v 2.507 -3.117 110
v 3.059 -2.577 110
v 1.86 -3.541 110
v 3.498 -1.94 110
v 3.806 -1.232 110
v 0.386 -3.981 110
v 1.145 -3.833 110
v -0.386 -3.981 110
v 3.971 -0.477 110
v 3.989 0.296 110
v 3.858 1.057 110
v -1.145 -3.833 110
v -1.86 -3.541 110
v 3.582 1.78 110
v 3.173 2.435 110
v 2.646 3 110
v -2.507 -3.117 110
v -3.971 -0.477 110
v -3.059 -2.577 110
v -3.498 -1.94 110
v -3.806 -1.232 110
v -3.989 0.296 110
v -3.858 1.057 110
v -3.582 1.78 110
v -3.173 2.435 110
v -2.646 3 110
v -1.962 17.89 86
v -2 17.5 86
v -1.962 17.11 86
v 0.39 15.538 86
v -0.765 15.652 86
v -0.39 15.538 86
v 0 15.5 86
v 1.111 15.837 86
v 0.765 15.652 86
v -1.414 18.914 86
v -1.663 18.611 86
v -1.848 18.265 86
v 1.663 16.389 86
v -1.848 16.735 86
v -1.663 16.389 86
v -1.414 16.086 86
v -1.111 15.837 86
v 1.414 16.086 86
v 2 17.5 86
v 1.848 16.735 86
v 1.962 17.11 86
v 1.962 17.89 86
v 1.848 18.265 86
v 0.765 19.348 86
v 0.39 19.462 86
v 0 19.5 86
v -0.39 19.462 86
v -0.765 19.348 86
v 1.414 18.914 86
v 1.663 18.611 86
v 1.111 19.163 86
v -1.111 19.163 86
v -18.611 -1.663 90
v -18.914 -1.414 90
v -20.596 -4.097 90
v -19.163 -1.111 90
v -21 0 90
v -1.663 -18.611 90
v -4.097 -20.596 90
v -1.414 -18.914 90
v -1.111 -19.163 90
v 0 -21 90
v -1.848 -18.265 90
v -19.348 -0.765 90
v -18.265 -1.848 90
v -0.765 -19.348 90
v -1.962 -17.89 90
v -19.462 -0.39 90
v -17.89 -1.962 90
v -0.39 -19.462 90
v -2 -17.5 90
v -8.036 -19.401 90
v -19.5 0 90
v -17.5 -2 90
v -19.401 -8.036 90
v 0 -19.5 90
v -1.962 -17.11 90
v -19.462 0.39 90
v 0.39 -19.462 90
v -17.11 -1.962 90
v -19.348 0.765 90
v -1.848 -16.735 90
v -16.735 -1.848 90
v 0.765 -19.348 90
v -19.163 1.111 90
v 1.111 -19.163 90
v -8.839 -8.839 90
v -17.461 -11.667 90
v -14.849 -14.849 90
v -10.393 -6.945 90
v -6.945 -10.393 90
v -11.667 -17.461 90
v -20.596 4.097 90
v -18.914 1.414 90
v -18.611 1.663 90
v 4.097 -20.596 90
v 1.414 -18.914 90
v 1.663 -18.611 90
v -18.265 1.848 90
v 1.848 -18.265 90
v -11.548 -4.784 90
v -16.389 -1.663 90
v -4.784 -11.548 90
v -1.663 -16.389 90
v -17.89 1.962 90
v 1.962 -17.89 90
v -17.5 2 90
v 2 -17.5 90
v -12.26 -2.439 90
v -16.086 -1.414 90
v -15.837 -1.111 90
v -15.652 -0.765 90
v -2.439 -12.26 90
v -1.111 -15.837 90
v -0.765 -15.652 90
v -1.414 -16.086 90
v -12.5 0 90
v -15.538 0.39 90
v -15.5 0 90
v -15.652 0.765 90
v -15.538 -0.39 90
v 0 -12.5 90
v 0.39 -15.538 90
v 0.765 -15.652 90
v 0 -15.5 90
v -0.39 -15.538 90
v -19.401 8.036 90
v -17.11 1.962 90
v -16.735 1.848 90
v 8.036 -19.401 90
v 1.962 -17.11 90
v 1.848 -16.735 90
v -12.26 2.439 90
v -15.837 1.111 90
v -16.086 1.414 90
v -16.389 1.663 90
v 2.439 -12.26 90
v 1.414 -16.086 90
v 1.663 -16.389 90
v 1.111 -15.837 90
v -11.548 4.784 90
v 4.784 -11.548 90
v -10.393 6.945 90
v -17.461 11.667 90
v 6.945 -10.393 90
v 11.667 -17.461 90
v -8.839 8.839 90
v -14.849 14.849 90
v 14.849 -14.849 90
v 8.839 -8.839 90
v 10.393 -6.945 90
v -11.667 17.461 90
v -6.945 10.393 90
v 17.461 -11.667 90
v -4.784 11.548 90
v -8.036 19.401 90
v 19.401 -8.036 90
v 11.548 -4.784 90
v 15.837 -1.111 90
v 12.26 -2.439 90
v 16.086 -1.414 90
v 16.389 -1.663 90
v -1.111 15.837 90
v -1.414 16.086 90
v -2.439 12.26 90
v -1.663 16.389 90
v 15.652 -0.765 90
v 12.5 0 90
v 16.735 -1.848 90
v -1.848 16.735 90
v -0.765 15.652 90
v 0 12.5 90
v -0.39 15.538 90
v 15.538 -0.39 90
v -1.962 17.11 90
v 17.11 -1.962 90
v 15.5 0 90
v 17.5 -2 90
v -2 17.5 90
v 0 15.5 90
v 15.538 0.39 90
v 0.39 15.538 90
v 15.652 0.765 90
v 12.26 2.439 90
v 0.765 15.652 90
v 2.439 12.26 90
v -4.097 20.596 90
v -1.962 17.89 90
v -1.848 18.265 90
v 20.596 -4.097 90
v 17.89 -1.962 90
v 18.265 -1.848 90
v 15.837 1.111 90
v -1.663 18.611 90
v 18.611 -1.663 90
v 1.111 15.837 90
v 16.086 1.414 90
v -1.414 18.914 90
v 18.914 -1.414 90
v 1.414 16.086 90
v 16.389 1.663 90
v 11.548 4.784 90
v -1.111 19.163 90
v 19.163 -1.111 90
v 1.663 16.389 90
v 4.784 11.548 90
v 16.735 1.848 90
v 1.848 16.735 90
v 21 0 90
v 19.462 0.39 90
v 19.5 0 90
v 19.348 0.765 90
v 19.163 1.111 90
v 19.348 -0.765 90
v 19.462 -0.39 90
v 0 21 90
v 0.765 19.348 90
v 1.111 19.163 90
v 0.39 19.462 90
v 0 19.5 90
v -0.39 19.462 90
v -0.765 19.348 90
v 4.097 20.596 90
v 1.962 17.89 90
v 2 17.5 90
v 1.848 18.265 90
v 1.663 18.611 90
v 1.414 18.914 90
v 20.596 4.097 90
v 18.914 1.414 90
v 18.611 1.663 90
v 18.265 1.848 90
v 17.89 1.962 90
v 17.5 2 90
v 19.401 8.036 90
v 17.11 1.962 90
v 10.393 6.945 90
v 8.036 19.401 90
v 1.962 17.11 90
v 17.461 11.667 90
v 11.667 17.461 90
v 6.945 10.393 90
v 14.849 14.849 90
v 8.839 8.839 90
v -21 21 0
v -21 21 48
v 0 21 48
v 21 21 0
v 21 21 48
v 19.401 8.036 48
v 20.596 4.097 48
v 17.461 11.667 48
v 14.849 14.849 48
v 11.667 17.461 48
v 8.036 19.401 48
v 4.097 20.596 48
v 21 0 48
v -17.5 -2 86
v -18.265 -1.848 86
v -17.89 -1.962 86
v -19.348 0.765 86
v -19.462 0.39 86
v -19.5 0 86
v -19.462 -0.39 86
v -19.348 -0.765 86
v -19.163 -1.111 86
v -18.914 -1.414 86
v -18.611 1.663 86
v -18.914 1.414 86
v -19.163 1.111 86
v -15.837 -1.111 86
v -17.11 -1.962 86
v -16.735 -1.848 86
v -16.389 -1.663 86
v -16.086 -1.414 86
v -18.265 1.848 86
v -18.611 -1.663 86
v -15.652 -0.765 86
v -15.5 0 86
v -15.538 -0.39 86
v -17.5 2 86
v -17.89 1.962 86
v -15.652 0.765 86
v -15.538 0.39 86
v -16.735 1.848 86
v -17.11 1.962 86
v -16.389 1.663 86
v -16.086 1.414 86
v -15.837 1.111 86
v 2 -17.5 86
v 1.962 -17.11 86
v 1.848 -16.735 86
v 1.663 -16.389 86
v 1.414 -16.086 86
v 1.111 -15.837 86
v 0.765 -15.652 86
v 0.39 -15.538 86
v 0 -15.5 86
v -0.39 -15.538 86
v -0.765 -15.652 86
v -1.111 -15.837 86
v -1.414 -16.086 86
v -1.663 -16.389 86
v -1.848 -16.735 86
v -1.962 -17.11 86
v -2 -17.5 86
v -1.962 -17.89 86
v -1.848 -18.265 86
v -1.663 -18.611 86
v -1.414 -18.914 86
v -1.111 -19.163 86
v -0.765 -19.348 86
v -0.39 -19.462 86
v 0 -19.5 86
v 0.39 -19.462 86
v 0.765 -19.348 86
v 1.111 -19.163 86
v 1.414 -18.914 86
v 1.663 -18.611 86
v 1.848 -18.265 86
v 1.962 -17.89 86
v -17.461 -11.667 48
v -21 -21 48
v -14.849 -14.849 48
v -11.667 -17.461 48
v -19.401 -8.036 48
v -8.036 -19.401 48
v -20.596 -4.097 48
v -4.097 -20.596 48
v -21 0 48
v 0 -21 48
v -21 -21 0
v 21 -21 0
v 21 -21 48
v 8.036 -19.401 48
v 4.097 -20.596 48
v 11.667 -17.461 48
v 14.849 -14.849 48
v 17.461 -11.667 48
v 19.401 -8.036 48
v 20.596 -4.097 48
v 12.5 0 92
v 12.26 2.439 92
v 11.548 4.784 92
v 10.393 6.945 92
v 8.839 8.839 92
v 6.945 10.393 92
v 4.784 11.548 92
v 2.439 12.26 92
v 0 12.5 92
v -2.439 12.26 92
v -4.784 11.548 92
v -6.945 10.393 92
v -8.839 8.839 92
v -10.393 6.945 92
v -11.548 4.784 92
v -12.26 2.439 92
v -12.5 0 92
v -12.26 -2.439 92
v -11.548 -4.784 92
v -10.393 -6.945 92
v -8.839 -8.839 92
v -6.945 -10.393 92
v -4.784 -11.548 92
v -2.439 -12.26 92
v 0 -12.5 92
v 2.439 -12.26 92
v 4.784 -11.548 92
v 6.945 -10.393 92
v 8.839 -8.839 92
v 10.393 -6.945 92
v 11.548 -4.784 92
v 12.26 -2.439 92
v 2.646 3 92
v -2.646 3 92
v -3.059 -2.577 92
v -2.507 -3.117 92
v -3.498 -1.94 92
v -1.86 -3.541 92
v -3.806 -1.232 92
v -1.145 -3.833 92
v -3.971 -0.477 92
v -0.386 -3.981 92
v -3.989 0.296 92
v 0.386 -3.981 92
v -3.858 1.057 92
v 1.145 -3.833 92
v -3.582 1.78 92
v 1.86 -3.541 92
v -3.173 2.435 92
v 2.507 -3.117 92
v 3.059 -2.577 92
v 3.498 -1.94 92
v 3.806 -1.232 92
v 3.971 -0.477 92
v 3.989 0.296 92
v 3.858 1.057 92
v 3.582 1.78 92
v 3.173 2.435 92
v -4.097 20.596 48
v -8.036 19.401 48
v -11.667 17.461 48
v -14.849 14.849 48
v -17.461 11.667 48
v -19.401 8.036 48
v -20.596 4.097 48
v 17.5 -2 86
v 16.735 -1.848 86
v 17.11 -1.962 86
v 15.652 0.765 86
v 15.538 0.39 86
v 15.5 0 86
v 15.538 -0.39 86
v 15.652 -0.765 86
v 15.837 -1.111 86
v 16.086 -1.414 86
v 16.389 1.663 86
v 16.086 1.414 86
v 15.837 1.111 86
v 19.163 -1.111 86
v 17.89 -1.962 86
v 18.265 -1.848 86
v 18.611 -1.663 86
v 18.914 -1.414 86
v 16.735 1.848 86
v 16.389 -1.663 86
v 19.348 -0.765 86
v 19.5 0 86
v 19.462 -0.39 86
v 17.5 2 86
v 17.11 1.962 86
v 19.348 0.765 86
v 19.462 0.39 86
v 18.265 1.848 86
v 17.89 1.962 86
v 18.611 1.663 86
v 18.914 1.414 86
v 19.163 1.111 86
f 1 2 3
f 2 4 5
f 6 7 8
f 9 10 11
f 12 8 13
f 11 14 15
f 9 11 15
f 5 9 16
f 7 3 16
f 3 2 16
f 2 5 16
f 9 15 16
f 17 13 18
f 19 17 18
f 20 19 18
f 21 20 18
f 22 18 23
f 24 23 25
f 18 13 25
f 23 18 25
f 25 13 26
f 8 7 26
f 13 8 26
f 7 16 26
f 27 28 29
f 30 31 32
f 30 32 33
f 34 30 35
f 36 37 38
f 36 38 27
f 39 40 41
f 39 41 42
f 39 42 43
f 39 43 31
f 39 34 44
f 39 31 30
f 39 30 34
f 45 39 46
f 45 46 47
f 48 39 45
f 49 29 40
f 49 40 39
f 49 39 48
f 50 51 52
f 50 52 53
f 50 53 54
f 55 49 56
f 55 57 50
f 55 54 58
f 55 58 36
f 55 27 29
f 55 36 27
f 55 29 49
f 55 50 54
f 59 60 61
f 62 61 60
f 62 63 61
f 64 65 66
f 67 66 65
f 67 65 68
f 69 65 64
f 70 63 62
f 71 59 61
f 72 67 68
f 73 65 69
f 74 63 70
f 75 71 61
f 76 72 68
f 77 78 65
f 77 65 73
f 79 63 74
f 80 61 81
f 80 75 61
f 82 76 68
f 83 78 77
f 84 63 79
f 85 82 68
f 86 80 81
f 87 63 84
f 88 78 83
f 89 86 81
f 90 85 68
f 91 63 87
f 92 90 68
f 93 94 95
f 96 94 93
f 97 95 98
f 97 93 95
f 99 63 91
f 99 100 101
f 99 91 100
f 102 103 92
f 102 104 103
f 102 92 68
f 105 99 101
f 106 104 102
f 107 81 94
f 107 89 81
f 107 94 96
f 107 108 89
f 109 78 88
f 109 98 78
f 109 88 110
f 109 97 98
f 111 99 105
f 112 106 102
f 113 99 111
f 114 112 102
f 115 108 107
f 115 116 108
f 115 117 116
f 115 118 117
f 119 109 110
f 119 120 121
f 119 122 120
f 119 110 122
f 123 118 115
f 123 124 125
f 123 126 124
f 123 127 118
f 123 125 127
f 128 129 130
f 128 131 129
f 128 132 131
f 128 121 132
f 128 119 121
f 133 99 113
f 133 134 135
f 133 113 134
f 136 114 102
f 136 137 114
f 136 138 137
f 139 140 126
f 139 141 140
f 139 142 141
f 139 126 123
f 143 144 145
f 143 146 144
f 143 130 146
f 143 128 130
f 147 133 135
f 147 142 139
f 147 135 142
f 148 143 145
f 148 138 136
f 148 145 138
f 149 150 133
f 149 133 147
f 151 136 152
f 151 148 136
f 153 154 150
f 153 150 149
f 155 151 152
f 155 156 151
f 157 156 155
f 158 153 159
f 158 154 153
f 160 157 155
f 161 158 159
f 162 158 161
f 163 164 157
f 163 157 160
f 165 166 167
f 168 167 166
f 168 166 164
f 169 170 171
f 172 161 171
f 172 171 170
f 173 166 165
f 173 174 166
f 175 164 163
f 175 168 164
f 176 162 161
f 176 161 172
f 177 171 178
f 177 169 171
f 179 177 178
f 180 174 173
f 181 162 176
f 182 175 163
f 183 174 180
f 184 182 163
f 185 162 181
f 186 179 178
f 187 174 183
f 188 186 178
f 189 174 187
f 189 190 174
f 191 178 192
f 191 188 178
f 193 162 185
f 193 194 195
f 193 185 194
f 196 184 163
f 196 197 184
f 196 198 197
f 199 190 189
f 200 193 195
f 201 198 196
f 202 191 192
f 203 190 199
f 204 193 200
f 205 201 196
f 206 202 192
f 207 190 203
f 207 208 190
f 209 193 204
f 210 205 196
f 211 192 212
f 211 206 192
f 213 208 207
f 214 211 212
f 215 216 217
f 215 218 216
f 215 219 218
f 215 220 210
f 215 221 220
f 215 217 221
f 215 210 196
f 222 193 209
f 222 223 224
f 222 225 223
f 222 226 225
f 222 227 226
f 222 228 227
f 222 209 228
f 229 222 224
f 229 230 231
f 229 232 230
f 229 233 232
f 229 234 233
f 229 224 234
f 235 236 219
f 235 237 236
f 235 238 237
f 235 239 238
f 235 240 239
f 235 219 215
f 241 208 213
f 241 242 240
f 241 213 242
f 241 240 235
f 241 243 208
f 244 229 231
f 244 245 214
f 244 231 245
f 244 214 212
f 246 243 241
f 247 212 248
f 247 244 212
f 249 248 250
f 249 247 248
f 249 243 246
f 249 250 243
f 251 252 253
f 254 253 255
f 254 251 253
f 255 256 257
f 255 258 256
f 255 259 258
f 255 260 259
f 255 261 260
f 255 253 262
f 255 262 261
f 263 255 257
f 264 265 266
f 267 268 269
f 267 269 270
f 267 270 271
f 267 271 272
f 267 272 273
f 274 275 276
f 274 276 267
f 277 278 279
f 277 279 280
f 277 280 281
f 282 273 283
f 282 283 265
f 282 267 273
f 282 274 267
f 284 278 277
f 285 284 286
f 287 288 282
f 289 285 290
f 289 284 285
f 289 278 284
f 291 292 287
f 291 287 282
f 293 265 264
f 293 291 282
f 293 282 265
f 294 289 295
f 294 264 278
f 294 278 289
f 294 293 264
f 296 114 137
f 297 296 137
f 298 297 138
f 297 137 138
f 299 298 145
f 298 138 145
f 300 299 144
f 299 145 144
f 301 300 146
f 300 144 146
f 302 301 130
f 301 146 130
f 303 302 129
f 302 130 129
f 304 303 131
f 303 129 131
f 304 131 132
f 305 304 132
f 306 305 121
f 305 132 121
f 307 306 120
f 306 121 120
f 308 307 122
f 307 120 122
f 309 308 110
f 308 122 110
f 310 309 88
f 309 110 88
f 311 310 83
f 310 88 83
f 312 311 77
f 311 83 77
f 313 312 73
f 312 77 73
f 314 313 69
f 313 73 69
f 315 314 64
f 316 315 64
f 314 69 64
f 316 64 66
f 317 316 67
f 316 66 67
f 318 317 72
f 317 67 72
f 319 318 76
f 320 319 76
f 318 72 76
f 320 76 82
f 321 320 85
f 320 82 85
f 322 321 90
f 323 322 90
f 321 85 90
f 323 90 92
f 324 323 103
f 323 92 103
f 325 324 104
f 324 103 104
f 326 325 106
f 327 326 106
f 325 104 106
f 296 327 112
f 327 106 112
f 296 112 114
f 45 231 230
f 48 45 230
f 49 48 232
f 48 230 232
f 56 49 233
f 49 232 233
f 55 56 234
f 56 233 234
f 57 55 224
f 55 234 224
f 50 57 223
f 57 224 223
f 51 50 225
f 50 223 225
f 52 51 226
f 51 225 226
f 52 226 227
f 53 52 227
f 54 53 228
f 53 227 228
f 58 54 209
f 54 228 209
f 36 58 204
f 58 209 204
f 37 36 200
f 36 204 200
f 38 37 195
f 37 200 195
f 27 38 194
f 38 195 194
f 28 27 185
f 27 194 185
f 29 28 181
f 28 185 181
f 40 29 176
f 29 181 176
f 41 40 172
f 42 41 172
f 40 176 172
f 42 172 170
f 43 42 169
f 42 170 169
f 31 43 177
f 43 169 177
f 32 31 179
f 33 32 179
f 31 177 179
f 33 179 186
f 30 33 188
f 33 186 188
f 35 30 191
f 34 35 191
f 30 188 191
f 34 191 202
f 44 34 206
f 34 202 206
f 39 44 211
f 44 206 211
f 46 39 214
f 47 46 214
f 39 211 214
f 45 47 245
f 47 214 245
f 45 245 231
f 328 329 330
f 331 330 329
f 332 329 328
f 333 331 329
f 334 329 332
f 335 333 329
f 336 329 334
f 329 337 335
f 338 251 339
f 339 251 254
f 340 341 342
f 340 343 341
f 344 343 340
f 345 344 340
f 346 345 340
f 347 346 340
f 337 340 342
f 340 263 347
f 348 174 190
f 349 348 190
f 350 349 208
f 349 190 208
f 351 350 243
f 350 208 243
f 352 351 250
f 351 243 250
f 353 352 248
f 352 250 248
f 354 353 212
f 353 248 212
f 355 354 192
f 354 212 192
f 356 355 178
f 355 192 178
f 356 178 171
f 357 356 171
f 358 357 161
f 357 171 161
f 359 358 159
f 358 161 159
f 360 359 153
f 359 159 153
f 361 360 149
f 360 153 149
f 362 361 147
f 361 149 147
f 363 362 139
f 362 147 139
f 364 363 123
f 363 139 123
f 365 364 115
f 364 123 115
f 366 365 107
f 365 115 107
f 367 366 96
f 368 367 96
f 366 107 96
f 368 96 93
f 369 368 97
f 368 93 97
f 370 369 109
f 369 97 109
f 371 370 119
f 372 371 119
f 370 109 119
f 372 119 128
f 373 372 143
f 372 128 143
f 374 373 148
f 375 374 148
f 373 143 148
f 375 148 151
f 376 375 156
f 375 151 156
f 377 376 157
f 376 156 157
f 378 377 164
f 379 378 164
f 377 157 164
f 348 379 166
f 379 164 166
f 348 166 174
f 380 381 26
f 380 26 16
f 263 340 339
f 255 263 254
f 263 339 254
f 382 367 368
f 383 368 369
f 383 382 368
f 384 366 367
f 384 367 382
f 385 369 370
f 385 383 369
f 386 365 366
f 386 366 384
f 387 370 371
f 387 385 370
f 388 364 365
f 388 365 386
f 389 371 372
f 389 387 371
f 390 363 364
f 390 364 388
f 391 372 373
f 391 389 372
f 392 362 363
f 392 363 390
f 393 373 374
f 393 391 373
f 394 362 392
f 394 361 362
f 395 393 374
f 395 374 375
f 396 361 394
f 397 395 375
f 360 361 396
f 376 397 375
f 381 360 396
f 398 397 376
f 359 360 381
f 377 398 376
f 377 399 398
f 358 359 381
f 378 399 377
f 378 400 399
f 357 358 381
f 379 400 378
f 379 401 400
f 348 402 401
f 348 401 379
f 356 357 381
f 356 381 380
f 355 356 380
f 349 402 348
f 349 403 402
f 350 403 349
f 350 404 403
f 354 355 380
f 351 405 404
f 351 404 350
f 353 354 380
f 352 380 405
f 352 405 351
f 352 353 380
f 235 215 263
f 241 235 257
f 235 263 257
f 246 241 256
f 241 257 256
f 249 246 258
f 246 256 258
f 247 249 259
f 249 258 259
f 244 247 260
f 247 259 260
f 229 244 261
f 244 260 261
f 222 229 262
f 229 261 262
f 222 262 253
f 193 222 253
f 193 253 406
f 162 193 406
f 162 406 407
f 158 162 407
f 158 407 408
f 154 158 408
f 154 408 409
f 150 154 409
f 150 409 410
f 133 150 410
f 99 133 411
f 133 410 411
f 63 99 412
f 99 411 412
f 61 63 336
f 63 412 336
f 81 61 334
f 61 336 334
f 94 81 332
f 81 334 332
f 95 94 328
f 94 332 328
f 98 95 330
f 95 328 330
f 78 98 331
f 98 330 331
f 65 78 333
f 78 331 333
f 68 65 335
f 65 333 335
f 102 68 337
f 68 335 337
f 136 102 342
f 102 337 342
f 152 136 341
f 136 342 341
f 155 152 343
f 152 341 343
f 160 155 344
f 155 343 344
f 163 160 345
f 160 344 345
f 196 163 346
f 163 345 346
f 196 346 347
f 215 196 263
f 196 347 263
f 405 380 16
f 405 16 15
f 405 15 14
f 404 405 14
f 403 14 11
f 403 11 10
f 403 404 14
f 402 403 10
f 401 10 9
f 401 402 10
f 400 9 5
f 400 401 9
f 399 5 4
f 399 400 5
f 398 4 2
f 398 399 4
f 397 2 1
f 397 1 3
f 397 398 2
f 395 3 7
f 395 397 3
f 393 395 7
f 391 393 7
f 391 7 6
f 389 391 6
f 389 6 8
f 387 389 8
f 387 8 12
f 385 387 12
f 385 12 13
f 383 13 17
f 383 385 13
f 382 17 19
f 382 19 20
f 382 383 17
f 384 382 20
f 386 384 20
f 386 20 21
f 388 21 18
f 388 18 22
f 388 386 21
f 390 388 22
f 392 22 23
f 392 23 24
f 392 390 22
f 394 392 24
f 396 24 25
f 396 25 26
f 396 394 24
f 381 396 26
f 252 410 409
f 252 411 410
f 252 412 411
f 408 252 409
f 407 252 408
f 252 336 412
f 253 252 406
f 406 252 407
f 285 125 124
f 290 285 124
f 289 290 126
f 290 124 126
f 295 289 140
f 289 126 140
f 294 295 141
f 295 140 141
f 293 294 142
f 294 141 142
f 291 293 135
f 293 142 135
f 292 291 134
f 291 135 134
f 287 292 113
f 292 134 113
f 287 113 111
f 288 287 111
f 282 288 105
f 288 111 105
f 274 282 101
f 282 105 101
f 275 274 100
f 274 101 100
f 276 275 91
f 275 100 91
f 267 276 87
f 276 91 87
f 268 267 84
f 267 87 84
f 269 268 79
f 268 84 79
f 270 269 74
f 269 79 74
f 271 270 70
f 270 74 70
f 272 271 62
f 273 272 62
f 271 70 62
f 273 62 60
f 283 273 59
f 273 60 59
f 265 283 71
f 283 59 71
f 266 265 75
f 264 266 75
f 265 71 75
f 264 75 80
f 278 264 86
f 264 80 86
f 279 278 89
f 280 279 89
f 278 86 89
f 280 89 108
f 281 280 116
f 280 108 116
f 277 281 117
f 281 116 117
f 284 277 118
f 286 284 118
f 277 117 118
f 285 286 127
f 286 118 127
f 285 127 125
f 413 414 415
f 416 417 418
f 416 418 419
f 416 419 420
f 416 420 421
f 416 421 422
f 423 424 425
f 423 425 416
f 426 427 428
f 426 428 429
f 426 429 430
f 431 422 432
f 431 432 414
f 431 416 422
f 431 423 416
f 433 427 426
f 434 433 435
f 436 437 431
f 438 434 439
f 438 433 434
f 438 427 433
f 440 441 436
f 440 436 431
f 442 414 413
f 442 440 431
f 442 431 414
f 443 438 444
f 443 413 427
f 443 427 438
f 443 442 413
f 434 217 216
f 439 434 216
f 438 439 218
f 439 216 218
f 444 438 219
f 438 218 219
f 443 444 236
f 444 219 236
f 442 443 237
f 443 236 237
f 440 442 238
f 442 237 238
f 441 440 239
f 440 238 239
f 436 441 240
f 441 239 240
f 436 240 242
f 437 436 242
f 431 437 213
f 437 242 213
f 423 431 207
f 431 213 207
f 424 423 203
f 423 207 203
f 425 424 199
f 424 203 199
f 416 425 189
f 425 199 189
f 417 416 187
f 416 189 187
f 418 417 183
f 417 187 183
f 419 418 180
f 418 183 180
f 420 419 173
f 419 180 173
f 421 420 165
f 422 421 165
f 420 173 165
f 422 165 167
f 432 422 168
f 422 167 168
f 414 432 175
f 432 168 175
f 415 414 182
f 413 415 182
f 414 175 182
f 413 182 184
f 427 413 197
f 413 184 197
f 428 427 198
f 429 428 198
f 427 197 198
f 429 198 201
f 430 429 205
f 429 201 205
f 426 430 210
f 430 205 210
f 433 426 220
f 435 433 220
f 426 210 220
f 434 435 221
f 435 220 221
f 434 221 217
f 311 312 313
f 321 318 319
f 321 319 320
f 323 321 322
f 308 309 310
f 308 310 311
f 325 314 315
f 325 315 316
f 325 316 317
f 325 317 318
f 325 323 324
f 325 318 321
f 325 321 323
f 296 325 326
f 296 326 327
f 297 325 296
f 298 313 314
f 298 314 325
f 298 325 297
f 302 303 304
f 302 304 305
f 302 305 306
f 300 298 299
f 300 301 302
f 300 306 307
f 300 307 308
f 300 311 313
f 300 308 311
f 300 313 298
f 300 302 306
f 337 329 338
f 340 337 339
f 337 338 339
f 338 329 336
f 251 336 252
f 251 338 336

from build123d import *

# Parameters (mm, degrees)
SKETCH_1_W          = 42
SKETCH_1_H          = 42
EXTRUDE_1_DEPTH     = 48
SKETCH_2_R          = 21
EXTRUDE_2_DEPTH     = 42
SKETCH_3_R          = 12.5
EXTRUDE_3_DEPTH     = 2
EXTRUDE_4_DEPTH     = 18
SKETCH_5_R          = 2
CUT_EXTRUDE_1_DEPTH = 4


with BuildPart() as part:
    # 草图1 → 凸台-拉伸1 (new body)
    with BuildSketch(Plane.XY):
        Rectangle(SKETCH_1_W, SKETCH_1_H)
    extrude(amount=EXTRUDE_1_DEPTH)

    # 草图2 → 凸台-拉伸2 (add)
    with BuildSketch(Plane.XY.offset(48)):
        Circle(SKETCH_2_R)
    extrude(amount=EXTRUDE_2_DEPTH)

    # 草图3 → 凸台-拉伸3 (add)
    with BuildSketch(Plane.XY.offset(90)):
        Circle(SKETCH_3_R)
    extrude(amount=EXTRUDE_3_DEPTH)

    # 草图4 → 凸台-拉伸4 (add)
    with BuildSketch(Plane.XY.offset(92)):
        with BuildLine():
            Line((-2.645751311, 3), (2.645751311, 3))
            ThreePointArc((2.645751311, 3), (0, -4), (-2.645751311, 3))
        make_face()
    extrude(amount=EXTRUDE_4_DEPTH)

    # 草图5 → 切除-拉伸1 (cut)
    with BuildSketch(Plane.XY.offset(90)):
        with Locations((0, -17.5)):
            Circle(SKETCH_5_R)
        with Locations((-17.5, 0)):
            Circle(SKETCH_5_R)
        with Locations((0, 17.5)):
            Circle(SKETCH_5_R)
        with Locations((17.5, 0)):
            Circle(SKETCH_5_R)
    extrude(amount=-CUT_EXTRUDE_1_DEPTH, mode=Mode.SUBTRACT)


solid = part.part
